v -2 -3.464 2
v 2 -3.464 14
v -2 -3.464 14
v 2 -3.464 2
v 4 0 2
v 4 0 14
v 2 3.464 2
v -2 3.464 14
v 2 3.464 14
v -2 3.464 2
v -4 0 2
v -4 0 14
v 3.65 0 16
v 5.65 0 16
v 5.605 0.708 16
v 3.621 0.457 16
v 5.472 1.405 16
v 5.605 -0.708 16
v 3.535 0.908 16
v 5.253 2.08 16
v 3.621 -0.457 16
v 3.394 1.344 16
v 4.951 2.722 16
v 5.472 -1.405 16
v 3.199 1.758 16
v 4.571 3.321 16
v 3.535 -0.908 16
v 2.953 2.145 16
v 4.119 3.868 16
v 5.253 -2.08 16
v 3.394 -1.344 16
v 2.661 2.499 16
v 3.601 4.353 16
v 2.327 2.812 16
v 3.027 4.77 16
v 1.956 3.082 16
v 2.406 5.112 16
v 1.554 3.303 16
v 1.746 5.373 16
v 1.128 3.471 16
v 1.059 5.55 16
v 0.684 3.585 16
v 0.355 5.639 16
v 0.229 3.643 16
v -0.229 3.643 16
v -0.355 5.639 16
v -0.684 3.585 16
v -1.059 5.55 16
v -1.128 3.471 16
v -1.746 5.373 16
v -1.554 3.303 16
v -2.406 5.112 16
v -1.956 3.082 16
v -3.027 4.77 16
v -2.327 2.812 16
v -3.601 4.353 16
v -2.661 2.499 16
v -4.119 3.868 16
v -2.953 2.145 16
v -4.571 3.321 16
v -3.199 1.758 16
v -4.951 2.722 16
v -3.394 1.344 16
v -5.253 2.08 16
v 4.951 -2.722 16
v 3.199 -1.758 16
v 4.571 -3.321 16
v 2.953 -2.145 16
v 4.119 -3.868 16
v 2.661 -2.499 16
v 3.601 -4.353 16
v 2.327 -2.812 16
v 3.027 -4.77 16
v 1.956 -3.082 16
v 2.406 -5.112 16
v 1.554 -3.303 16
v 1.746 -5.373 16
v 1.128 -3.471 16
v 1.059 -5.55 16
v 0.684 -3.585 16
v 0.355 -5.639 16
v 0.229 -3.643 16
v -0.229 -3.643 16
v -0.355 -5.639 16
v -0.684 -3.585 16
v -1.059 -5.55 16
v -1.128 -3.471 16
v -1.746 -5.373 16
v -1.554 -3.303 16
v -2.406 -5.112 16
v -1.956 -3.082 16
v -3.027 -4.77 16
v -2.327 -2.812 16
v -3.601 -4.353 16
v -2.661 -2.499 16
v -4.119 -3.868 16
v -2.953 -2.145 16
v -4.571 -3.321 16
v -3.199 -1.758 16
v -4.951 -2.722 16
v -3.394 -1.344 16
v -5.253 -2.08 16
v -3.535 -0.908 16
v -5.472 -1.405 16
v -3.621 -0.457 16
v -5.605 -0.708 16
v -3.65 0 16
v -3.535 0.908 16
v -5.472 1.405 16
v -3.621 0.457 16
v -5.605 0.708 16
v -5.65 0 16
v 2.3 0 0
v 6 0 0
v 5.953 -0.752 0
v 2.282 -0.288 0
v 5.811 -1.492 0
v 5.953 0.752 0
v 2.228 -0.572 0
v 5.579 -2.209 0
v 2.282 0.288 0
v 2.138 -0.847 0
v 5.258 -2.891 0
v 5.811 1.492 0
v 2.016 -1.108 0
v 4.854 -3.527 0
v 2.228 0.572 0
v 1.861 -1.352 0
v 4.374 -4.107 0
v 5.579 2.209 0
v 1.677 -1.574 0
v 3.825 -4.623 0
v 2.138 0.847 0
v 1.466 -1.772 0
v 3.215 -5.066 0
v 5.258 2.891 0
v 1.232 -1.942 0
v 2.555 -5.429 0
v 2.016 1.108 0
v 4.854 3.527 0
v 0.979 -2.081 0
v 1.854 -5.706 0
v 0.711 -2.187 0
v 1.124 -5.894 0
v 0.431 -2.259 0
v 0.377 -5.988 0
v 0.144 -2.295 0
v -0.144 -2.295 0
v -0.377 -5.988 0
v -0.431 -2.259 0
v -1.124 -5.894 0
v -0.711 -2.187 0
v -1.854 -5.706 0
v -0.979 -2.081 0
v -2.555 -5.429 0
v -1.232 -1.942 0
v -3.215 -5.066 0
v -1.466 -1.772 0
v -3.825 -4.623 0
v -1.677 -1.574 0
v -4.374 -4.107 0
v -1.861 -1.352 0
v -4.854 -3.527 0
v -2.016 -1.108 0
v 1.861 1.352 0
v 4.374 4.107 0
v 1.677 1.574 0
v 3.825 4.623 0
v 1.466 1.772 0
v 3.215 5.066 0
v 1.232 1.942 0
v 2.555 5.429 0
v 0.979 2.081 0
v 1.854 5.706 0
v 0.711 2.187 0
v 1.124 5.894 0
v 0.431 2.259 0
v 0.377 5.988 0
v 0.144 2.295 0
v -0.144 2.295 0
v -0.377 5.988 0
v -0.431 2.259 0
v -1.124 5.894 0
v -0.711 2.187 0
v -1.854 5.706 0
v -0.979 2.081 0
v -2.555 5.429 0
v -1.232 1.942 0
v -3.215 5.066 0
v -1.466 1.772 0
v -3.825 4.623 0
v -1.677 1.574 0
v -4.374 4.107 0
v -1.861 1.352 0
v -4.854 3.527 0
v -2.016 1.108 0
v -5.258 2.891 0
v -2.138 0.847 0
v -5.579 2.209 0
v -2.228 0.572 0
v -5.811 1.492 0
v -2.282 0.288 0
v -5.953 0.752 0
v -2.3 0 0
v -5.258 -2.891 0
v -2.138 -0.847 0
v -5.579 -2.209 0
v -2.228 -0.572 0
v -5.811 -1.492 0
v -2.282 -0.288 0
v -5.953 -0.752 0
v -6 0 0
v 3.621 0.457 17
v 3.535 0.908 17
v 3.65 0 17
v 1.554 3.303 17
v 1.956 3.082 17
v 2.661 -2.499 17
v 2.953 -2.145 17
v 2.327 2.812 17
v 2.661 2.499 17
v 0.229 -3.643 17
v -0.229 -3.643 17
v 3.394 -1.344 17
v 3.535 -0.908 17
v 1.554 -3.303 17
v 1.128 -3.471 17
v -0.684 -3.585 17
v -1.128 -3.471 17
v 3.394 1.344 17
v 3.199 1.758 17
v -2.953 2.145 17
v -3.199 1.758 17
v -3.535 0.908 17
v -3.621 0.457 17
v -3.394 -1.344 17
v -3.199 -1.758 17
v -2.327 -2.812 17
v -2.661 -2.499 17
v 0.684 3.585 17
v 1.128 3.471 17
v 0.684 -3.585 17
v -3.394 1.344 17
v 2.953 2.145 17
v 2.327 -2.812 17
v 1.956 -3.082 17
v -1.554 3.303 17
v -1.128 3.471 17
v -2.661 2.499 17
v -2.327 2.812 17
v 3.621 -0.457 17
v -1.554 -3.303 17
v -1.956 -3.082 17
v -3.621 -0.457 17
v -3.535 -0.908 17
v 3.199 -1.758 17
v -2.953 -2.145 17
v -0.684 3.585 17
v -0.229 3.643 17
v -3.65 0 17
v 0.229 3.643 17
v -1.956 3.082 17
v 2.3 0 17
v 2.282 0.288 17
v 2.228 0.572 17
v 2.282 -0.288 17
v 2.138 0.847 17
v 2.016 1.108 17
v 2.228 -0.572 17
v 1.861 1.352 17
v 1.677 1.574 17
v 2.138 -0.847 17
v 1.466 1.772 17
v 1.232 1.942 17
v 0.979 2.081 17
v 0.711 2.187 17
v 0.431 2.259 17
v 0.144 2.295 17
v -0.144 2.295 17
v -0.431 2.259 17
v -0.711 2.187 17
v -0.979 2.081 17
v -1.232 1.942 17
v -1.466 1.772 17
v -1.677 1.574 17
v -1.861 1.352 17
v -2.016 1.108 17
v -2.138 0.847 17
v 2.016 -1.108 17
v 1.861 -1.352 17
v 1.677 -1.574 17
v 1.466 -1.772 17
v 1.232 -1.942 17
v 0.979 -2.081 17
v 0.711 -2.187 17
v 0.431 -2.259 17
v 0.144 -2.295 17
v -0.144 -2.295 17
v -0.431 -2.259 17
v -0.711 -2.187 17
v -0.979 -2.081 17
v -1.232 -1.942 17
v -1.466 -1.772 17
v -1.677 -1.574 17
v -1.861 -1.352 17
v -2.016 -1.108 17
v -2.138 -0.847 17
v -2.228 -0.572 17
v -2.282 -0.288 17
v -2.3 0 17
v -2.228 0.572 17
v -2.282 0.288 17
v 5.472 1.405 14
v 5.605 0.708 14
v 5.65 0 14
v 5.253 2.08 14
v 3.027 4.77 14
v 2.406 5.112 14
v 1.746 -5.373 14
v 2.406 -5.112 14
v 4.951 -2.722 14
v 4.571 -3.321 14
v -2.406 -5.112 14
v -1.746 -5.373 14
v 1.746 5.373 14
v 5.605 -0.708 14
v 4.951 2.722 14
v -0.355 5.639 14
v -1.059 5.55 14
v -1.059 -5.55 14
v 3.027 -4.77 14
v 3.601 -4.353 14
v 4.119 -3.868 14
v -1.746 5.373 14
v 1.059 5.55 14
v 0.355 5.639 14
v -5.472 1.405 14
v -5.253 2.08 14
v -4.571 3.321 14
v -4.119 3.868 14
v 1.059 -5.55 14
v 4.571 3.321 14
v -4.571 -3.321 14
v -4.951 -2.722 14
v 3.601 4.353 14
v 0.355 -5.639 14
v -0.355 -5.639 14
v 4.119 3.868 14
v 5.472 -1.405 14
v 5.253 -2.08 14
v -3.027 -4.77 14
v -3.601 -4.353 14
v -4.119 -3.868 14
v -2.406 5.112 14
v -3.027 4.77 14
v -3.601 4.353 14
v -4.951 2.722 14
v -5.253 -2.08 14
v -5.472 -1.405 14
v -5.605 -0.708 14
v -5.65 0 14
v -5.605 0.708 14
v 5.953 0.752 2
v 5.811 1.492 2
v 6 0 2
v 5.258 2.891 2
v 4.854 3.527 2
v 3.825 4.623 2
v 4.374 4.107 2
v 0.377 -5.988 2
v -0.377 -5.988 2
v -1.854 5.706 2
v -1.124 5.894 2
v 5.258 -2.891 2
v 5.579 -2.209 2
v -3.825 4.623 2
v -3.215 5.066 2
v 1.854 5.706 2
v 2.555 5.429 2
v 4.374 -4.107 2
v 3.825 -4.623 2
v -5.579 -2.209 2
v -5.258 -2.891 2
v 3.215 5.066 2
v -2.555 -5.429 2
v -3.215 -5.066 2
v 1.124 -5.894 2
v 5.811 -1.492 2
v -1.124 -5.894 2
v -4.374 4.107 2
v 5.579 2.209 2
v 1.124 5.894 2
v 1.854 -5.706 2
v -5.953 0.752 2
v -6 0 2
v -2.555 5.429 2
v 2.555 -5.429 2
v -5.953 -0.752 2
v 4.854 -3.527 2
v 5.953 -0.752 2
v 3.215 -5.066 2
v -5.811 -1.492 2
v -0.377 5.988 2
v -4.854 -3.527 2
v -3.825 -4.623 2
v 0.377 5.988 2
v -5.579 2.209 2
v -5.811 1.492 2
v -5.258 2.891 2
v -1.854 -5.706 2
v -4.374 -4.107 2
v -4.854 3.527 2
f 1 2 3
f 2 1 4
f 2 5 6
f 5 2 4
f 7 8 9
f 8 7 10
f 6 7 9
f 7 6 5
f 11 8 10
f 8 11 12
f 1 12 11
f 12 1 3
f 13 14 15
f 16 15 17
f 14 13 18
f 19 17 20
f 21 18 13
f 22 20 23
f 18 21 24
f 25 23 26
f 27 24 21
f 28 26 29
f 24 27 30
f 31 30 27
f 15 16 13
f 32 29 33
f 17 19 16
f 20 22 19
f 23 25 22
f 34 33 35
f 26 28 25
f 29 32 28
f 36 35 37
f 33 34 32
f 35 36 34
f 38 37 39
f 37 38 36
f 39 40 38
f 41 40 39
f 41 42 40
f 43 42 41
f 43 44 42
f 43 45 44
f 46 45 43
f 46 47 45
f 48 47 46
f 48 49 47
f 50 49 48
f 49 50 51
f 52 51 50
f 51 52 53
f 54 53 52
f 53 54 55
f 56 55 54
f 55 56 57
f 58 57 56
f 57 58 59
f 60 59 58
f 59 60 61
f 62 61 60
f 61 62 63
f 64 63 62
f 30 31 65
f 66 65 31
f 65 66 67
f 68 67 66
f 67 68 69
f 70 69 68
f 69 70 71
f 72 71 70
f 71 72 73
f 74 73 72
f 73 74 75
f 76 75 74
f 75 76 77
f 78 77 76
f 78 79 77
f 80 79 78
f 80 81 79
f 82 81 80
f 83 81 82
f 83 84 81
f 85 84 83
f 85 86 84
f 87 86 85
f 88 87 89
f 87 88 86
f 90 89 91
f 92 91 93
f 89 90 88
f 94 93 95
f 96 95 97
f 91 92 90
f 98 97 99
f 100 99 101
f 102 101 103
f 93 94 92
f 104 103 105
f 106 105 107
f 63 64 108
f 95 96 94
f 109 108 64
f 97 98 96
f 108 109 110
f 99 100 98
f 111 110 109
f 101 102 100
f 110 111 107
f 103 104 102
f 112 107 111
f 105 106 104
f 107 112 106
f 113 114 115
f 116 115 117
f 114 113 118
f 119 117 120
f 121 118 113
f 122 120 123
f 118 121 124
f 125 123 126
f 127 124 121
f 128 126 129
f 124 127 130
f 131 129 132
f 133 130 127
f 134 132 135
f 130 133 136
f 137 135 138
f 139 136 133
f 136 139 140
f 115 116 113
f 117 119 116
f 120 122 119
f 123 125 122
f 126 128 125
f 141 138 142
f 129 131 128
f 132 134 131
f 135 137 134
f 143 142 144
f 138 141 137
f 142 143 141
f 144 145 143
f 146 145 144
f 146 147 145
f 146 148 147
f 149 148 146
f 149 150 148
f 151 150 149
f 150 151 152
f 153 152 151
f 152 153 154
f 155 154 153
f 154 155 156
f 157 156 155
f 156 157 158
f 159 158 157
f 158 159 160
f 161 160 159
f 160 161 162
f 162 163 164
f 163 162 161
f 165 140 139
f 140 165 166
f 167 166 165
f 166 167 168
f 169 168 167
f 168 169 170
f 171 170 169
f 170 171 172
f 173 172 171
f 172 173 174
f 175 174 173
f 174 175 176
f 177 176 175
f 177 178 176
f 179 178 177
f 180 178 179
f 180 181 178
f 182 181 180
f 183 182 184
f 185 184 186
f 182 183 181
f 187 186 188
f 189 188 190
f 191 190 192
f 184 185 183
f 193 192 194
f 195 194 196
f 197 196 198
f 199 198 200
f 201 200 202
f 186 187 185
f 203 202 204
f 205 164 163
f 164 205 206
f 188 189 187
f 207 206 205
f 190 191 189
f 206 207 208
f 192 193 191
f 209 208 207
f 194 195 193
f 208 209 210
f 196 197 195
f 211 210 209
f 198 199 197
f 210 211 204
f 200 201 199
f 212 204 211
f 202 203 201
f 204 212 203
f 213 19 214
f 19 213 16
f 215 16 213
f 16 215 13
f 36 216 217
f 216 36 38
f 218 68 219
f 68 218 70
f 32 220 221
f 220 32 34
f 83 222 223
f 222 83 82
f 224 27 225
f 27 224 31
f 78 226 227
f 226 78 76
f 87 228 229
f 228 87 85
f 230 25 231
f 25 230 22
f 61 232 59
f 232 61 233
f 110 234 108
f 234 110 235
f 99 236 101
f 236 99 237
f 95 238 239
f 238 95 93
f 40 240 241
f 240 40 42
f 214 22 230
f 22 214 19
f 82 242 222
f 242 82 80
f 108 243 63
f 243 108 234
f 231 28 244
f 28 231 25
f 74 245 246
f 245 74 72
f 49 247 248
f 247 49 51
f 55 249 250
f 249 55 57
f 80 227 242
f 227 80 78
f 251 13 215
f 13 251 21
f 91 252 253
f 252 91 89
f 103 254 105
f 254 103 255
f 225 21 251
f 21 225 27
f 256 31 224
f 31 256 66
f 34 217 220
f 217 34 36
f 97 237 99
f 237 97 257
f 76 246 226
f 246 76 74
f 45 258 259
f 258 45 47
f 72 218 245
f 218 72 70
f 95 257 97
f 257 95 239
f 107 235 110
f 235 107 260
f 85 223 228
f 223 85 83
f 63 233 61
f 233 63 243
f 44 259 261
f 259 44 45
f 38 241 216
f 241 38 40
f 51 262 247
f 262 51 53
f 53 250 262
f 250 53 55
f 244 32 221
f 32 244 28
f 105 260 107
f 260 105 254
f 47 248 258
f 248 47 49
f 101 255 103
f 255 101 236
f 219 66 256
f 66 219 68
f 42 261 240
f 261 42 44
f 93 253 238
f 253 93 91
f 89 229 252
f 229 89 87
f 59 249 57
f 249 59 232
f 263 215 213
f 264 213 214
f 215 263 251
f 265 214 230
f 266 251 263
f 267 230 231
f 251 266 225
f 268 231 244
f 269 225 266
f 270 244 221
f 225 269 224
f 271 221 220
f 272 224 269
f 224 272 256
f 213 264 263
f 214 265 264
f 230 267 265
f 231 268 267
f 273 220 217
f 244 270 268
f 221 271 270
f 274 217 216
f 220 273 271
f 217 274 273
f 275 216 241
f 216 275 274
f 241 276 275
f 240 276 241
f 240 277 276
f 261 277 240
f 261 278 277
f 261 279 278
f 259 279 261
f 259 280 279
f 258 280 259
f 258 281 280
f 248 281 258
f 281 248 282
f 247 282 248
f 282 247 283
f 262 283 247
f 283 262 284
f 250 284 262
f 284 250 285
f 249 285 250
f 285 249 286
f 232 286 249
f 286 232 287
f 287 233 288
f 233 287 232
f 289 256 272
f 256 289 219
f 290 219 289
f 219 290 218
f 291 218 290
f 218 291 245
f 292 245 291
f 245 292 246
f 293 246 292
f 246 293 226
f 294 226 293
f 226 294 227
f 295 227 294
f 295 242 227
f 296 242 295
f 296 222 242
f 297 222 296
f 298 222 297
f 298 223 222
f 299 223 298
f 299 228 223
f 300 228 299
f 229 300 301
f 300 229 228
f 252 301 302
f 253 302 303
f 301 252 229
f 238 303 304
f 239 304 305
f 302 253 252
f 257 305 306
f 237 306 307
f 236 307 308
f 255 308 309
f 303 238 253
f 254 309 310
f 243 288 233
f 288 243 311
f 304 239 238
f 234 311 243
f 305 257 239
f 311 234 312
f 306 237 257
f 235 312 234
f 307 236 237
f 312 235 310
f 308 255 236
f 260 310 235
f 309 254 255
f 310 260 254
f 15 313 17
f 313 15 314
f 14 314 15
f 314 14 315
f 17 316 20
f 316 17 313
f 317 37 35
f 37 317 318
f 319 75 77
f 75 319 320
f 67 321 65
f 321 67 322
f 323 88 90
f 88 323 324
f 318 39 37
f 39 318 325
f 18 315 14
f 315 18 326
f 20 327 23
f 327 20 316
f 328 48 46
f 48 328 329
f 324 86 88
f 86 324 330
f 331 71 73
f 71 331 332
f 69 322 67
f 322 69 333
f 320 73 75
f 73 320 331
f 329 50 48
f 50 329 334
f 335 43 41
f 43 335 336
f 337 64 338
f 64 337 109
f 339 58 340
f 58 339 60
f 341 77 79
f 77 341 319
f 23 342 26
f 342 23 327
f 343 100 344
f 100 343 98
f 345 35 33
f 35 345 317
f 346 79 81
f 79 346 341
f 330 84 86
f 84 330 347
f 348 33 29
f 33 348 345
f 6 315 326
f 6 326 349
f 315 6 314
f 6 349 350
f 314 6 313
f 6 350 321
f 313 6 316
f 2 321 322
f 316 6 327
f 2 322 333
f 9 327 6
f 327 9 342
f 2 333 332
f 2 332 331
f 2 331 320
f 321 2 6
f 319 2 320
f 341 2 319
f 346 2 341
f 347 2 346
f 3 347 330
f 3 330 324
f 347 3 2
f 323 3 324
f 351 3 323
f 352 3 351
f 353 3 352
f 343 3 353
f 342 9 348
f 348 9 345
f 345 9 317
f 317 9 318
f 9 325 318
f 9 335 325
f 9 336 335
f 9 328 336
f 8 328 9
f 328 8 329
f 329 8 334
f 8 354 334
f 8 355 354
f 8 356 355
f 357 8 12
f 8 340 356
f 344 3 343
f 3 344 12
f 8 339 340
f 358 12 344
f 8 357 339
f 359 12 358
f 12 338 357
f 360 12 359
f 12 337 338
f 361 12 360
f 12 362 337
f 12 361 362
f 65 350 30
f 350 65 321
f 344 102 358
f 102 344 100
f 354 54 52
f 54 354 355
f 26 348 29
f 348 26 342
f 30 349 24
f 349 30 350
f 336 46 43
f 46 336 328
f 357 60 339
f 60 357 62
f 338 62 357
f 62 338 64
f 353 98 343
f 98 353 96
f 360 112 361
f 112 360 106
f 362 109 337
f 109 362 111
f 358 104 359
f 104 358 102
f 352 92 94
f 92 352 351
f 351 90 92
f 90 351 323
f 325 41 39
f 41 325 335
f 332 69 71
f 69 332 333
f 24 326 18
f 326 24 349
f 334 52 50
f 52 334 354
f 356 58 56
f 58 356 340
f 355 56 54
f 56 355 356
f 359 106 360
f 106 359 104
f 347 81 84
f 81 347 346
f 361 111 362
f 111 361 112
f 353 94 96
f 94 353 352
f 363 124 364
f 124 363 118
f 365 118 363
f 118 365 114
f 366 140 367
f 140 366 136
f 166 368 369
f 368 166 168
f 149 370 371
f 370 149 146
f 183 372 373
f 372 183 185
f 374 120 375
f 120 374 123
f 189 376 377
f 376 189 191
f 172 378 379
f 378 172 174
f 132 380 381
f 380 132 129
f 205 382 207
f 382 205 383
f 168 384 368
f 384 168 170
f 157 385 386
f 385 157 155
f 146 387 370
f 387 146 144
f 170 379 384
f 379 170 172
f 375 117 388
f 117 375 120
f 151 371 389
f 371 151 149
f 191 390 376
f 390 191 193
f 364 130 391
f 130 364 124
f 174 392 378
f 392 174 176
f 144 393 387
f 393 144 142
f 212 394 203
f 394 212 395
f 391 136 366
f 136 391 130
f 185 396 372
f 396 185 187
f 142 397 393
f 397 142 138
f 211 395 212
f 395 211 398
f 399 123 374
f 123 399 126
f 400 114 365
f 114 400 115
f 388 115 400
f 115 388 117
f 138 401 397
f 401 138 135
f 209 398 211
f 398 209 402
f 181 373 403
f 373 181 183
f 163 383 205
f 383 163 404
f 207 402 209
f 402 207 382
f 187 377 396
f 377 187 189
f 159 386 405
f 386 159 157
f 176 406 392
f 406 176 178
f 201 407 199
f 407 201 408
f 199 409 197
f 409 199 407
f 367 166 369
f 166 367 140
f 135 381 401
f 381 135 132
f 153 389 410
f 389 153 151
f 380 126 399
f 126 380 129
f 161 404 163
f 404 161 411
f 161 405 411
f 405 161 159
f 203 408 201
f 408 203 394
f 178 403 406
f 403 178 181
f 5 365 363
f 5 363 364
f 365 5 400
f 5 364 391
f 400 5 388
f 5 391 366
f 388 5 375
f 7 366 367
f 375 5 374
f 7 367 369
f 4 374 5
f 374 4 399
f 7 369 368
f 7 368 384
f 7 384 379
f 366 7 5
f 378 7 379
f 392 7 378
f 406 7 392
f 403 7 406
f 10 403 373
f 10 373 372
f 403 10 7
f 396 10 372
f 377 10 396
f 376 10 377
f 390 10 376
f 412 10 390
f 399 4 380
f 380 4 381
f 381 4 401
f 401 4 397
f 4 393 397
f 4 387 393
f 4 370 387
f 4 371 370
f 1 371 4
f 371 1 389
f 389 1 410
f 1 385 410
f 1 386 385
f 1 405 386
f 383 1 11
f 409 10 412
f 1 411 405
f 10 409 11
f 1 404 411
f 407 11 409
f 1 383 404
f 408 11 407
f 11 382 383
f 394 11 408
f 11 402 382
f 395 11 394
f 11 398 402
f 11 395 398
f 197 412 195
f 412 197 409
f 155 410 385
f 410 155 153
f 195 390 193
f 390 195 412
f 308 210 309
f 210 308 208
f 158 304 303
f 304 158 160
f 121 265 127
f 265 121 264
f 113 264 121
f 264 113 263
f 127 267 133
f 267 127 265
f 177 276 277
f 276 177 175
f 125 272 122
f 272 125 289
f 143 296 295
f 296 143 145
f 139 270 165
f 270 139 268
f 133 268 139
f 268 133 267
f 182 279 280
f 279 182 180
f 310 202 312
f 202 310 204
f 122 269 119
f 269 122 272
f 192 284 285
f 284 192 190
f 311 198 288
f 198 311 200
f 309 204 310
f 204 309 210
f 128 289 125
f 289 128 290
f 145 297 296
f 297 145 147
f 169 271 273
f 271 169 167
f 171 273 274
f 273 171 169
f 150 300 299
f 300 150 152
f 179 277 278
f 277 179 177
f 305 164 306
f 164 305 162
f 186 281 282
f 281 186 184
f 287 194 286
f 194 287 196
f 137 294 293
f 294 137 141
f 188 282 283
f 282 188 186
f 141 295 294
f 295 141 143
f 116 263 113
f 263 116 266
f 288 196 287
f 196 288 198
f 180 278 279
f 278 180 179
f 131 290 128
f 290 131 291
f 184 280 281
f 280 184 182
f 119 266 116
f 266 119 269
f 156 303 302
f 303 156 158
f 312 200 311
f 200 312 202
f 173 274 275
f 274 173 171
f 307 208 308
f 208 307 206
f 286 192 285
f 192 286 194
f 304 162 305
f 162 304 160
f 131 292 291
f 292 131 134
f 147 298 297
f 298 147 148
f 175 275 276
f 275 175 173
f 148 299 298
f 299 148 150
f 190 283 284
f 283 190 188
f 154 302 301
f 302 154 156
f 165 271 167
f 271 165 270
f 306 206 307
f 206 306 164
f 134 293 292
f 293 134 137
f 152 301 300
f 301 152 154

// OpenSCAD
/*
  Entretoises de fixation mouvements (ancien lecteur de CD/DVD)
  Projets DIY - 02/20016 - http://www.projetsdiy.fr
  v1
*/

$fn = 50;
hauteur = 16;       //Hauteur de l'entretoise
   

module entretoise(diam_centreur){
  difference(){
    union(){
      cylinder(r=4,h=hauteur,$fn=6);   //Corps entretoise
      translate([0,0,hauteur]) cylinder(r=diam_centreur / 2,h=2,center=true); //Centreur
      translate([0,0,hauteur - 2]) cylinder(r= diam_centreur / 2 + 2, h=2);   //Colerette
      cylinder(r=6,h=2); 
    }
    cylinder(r=2.3, h=30);                      //Passage de vis
  }
}

for (a=[0:0]){
    //translate([a, 0,0]) entretoise(5.6);        //4 entretoises avec petit centreur
    translate([a, 0,0]) entretoise(7.3);       //4 entretoises avec gros centreur
}
